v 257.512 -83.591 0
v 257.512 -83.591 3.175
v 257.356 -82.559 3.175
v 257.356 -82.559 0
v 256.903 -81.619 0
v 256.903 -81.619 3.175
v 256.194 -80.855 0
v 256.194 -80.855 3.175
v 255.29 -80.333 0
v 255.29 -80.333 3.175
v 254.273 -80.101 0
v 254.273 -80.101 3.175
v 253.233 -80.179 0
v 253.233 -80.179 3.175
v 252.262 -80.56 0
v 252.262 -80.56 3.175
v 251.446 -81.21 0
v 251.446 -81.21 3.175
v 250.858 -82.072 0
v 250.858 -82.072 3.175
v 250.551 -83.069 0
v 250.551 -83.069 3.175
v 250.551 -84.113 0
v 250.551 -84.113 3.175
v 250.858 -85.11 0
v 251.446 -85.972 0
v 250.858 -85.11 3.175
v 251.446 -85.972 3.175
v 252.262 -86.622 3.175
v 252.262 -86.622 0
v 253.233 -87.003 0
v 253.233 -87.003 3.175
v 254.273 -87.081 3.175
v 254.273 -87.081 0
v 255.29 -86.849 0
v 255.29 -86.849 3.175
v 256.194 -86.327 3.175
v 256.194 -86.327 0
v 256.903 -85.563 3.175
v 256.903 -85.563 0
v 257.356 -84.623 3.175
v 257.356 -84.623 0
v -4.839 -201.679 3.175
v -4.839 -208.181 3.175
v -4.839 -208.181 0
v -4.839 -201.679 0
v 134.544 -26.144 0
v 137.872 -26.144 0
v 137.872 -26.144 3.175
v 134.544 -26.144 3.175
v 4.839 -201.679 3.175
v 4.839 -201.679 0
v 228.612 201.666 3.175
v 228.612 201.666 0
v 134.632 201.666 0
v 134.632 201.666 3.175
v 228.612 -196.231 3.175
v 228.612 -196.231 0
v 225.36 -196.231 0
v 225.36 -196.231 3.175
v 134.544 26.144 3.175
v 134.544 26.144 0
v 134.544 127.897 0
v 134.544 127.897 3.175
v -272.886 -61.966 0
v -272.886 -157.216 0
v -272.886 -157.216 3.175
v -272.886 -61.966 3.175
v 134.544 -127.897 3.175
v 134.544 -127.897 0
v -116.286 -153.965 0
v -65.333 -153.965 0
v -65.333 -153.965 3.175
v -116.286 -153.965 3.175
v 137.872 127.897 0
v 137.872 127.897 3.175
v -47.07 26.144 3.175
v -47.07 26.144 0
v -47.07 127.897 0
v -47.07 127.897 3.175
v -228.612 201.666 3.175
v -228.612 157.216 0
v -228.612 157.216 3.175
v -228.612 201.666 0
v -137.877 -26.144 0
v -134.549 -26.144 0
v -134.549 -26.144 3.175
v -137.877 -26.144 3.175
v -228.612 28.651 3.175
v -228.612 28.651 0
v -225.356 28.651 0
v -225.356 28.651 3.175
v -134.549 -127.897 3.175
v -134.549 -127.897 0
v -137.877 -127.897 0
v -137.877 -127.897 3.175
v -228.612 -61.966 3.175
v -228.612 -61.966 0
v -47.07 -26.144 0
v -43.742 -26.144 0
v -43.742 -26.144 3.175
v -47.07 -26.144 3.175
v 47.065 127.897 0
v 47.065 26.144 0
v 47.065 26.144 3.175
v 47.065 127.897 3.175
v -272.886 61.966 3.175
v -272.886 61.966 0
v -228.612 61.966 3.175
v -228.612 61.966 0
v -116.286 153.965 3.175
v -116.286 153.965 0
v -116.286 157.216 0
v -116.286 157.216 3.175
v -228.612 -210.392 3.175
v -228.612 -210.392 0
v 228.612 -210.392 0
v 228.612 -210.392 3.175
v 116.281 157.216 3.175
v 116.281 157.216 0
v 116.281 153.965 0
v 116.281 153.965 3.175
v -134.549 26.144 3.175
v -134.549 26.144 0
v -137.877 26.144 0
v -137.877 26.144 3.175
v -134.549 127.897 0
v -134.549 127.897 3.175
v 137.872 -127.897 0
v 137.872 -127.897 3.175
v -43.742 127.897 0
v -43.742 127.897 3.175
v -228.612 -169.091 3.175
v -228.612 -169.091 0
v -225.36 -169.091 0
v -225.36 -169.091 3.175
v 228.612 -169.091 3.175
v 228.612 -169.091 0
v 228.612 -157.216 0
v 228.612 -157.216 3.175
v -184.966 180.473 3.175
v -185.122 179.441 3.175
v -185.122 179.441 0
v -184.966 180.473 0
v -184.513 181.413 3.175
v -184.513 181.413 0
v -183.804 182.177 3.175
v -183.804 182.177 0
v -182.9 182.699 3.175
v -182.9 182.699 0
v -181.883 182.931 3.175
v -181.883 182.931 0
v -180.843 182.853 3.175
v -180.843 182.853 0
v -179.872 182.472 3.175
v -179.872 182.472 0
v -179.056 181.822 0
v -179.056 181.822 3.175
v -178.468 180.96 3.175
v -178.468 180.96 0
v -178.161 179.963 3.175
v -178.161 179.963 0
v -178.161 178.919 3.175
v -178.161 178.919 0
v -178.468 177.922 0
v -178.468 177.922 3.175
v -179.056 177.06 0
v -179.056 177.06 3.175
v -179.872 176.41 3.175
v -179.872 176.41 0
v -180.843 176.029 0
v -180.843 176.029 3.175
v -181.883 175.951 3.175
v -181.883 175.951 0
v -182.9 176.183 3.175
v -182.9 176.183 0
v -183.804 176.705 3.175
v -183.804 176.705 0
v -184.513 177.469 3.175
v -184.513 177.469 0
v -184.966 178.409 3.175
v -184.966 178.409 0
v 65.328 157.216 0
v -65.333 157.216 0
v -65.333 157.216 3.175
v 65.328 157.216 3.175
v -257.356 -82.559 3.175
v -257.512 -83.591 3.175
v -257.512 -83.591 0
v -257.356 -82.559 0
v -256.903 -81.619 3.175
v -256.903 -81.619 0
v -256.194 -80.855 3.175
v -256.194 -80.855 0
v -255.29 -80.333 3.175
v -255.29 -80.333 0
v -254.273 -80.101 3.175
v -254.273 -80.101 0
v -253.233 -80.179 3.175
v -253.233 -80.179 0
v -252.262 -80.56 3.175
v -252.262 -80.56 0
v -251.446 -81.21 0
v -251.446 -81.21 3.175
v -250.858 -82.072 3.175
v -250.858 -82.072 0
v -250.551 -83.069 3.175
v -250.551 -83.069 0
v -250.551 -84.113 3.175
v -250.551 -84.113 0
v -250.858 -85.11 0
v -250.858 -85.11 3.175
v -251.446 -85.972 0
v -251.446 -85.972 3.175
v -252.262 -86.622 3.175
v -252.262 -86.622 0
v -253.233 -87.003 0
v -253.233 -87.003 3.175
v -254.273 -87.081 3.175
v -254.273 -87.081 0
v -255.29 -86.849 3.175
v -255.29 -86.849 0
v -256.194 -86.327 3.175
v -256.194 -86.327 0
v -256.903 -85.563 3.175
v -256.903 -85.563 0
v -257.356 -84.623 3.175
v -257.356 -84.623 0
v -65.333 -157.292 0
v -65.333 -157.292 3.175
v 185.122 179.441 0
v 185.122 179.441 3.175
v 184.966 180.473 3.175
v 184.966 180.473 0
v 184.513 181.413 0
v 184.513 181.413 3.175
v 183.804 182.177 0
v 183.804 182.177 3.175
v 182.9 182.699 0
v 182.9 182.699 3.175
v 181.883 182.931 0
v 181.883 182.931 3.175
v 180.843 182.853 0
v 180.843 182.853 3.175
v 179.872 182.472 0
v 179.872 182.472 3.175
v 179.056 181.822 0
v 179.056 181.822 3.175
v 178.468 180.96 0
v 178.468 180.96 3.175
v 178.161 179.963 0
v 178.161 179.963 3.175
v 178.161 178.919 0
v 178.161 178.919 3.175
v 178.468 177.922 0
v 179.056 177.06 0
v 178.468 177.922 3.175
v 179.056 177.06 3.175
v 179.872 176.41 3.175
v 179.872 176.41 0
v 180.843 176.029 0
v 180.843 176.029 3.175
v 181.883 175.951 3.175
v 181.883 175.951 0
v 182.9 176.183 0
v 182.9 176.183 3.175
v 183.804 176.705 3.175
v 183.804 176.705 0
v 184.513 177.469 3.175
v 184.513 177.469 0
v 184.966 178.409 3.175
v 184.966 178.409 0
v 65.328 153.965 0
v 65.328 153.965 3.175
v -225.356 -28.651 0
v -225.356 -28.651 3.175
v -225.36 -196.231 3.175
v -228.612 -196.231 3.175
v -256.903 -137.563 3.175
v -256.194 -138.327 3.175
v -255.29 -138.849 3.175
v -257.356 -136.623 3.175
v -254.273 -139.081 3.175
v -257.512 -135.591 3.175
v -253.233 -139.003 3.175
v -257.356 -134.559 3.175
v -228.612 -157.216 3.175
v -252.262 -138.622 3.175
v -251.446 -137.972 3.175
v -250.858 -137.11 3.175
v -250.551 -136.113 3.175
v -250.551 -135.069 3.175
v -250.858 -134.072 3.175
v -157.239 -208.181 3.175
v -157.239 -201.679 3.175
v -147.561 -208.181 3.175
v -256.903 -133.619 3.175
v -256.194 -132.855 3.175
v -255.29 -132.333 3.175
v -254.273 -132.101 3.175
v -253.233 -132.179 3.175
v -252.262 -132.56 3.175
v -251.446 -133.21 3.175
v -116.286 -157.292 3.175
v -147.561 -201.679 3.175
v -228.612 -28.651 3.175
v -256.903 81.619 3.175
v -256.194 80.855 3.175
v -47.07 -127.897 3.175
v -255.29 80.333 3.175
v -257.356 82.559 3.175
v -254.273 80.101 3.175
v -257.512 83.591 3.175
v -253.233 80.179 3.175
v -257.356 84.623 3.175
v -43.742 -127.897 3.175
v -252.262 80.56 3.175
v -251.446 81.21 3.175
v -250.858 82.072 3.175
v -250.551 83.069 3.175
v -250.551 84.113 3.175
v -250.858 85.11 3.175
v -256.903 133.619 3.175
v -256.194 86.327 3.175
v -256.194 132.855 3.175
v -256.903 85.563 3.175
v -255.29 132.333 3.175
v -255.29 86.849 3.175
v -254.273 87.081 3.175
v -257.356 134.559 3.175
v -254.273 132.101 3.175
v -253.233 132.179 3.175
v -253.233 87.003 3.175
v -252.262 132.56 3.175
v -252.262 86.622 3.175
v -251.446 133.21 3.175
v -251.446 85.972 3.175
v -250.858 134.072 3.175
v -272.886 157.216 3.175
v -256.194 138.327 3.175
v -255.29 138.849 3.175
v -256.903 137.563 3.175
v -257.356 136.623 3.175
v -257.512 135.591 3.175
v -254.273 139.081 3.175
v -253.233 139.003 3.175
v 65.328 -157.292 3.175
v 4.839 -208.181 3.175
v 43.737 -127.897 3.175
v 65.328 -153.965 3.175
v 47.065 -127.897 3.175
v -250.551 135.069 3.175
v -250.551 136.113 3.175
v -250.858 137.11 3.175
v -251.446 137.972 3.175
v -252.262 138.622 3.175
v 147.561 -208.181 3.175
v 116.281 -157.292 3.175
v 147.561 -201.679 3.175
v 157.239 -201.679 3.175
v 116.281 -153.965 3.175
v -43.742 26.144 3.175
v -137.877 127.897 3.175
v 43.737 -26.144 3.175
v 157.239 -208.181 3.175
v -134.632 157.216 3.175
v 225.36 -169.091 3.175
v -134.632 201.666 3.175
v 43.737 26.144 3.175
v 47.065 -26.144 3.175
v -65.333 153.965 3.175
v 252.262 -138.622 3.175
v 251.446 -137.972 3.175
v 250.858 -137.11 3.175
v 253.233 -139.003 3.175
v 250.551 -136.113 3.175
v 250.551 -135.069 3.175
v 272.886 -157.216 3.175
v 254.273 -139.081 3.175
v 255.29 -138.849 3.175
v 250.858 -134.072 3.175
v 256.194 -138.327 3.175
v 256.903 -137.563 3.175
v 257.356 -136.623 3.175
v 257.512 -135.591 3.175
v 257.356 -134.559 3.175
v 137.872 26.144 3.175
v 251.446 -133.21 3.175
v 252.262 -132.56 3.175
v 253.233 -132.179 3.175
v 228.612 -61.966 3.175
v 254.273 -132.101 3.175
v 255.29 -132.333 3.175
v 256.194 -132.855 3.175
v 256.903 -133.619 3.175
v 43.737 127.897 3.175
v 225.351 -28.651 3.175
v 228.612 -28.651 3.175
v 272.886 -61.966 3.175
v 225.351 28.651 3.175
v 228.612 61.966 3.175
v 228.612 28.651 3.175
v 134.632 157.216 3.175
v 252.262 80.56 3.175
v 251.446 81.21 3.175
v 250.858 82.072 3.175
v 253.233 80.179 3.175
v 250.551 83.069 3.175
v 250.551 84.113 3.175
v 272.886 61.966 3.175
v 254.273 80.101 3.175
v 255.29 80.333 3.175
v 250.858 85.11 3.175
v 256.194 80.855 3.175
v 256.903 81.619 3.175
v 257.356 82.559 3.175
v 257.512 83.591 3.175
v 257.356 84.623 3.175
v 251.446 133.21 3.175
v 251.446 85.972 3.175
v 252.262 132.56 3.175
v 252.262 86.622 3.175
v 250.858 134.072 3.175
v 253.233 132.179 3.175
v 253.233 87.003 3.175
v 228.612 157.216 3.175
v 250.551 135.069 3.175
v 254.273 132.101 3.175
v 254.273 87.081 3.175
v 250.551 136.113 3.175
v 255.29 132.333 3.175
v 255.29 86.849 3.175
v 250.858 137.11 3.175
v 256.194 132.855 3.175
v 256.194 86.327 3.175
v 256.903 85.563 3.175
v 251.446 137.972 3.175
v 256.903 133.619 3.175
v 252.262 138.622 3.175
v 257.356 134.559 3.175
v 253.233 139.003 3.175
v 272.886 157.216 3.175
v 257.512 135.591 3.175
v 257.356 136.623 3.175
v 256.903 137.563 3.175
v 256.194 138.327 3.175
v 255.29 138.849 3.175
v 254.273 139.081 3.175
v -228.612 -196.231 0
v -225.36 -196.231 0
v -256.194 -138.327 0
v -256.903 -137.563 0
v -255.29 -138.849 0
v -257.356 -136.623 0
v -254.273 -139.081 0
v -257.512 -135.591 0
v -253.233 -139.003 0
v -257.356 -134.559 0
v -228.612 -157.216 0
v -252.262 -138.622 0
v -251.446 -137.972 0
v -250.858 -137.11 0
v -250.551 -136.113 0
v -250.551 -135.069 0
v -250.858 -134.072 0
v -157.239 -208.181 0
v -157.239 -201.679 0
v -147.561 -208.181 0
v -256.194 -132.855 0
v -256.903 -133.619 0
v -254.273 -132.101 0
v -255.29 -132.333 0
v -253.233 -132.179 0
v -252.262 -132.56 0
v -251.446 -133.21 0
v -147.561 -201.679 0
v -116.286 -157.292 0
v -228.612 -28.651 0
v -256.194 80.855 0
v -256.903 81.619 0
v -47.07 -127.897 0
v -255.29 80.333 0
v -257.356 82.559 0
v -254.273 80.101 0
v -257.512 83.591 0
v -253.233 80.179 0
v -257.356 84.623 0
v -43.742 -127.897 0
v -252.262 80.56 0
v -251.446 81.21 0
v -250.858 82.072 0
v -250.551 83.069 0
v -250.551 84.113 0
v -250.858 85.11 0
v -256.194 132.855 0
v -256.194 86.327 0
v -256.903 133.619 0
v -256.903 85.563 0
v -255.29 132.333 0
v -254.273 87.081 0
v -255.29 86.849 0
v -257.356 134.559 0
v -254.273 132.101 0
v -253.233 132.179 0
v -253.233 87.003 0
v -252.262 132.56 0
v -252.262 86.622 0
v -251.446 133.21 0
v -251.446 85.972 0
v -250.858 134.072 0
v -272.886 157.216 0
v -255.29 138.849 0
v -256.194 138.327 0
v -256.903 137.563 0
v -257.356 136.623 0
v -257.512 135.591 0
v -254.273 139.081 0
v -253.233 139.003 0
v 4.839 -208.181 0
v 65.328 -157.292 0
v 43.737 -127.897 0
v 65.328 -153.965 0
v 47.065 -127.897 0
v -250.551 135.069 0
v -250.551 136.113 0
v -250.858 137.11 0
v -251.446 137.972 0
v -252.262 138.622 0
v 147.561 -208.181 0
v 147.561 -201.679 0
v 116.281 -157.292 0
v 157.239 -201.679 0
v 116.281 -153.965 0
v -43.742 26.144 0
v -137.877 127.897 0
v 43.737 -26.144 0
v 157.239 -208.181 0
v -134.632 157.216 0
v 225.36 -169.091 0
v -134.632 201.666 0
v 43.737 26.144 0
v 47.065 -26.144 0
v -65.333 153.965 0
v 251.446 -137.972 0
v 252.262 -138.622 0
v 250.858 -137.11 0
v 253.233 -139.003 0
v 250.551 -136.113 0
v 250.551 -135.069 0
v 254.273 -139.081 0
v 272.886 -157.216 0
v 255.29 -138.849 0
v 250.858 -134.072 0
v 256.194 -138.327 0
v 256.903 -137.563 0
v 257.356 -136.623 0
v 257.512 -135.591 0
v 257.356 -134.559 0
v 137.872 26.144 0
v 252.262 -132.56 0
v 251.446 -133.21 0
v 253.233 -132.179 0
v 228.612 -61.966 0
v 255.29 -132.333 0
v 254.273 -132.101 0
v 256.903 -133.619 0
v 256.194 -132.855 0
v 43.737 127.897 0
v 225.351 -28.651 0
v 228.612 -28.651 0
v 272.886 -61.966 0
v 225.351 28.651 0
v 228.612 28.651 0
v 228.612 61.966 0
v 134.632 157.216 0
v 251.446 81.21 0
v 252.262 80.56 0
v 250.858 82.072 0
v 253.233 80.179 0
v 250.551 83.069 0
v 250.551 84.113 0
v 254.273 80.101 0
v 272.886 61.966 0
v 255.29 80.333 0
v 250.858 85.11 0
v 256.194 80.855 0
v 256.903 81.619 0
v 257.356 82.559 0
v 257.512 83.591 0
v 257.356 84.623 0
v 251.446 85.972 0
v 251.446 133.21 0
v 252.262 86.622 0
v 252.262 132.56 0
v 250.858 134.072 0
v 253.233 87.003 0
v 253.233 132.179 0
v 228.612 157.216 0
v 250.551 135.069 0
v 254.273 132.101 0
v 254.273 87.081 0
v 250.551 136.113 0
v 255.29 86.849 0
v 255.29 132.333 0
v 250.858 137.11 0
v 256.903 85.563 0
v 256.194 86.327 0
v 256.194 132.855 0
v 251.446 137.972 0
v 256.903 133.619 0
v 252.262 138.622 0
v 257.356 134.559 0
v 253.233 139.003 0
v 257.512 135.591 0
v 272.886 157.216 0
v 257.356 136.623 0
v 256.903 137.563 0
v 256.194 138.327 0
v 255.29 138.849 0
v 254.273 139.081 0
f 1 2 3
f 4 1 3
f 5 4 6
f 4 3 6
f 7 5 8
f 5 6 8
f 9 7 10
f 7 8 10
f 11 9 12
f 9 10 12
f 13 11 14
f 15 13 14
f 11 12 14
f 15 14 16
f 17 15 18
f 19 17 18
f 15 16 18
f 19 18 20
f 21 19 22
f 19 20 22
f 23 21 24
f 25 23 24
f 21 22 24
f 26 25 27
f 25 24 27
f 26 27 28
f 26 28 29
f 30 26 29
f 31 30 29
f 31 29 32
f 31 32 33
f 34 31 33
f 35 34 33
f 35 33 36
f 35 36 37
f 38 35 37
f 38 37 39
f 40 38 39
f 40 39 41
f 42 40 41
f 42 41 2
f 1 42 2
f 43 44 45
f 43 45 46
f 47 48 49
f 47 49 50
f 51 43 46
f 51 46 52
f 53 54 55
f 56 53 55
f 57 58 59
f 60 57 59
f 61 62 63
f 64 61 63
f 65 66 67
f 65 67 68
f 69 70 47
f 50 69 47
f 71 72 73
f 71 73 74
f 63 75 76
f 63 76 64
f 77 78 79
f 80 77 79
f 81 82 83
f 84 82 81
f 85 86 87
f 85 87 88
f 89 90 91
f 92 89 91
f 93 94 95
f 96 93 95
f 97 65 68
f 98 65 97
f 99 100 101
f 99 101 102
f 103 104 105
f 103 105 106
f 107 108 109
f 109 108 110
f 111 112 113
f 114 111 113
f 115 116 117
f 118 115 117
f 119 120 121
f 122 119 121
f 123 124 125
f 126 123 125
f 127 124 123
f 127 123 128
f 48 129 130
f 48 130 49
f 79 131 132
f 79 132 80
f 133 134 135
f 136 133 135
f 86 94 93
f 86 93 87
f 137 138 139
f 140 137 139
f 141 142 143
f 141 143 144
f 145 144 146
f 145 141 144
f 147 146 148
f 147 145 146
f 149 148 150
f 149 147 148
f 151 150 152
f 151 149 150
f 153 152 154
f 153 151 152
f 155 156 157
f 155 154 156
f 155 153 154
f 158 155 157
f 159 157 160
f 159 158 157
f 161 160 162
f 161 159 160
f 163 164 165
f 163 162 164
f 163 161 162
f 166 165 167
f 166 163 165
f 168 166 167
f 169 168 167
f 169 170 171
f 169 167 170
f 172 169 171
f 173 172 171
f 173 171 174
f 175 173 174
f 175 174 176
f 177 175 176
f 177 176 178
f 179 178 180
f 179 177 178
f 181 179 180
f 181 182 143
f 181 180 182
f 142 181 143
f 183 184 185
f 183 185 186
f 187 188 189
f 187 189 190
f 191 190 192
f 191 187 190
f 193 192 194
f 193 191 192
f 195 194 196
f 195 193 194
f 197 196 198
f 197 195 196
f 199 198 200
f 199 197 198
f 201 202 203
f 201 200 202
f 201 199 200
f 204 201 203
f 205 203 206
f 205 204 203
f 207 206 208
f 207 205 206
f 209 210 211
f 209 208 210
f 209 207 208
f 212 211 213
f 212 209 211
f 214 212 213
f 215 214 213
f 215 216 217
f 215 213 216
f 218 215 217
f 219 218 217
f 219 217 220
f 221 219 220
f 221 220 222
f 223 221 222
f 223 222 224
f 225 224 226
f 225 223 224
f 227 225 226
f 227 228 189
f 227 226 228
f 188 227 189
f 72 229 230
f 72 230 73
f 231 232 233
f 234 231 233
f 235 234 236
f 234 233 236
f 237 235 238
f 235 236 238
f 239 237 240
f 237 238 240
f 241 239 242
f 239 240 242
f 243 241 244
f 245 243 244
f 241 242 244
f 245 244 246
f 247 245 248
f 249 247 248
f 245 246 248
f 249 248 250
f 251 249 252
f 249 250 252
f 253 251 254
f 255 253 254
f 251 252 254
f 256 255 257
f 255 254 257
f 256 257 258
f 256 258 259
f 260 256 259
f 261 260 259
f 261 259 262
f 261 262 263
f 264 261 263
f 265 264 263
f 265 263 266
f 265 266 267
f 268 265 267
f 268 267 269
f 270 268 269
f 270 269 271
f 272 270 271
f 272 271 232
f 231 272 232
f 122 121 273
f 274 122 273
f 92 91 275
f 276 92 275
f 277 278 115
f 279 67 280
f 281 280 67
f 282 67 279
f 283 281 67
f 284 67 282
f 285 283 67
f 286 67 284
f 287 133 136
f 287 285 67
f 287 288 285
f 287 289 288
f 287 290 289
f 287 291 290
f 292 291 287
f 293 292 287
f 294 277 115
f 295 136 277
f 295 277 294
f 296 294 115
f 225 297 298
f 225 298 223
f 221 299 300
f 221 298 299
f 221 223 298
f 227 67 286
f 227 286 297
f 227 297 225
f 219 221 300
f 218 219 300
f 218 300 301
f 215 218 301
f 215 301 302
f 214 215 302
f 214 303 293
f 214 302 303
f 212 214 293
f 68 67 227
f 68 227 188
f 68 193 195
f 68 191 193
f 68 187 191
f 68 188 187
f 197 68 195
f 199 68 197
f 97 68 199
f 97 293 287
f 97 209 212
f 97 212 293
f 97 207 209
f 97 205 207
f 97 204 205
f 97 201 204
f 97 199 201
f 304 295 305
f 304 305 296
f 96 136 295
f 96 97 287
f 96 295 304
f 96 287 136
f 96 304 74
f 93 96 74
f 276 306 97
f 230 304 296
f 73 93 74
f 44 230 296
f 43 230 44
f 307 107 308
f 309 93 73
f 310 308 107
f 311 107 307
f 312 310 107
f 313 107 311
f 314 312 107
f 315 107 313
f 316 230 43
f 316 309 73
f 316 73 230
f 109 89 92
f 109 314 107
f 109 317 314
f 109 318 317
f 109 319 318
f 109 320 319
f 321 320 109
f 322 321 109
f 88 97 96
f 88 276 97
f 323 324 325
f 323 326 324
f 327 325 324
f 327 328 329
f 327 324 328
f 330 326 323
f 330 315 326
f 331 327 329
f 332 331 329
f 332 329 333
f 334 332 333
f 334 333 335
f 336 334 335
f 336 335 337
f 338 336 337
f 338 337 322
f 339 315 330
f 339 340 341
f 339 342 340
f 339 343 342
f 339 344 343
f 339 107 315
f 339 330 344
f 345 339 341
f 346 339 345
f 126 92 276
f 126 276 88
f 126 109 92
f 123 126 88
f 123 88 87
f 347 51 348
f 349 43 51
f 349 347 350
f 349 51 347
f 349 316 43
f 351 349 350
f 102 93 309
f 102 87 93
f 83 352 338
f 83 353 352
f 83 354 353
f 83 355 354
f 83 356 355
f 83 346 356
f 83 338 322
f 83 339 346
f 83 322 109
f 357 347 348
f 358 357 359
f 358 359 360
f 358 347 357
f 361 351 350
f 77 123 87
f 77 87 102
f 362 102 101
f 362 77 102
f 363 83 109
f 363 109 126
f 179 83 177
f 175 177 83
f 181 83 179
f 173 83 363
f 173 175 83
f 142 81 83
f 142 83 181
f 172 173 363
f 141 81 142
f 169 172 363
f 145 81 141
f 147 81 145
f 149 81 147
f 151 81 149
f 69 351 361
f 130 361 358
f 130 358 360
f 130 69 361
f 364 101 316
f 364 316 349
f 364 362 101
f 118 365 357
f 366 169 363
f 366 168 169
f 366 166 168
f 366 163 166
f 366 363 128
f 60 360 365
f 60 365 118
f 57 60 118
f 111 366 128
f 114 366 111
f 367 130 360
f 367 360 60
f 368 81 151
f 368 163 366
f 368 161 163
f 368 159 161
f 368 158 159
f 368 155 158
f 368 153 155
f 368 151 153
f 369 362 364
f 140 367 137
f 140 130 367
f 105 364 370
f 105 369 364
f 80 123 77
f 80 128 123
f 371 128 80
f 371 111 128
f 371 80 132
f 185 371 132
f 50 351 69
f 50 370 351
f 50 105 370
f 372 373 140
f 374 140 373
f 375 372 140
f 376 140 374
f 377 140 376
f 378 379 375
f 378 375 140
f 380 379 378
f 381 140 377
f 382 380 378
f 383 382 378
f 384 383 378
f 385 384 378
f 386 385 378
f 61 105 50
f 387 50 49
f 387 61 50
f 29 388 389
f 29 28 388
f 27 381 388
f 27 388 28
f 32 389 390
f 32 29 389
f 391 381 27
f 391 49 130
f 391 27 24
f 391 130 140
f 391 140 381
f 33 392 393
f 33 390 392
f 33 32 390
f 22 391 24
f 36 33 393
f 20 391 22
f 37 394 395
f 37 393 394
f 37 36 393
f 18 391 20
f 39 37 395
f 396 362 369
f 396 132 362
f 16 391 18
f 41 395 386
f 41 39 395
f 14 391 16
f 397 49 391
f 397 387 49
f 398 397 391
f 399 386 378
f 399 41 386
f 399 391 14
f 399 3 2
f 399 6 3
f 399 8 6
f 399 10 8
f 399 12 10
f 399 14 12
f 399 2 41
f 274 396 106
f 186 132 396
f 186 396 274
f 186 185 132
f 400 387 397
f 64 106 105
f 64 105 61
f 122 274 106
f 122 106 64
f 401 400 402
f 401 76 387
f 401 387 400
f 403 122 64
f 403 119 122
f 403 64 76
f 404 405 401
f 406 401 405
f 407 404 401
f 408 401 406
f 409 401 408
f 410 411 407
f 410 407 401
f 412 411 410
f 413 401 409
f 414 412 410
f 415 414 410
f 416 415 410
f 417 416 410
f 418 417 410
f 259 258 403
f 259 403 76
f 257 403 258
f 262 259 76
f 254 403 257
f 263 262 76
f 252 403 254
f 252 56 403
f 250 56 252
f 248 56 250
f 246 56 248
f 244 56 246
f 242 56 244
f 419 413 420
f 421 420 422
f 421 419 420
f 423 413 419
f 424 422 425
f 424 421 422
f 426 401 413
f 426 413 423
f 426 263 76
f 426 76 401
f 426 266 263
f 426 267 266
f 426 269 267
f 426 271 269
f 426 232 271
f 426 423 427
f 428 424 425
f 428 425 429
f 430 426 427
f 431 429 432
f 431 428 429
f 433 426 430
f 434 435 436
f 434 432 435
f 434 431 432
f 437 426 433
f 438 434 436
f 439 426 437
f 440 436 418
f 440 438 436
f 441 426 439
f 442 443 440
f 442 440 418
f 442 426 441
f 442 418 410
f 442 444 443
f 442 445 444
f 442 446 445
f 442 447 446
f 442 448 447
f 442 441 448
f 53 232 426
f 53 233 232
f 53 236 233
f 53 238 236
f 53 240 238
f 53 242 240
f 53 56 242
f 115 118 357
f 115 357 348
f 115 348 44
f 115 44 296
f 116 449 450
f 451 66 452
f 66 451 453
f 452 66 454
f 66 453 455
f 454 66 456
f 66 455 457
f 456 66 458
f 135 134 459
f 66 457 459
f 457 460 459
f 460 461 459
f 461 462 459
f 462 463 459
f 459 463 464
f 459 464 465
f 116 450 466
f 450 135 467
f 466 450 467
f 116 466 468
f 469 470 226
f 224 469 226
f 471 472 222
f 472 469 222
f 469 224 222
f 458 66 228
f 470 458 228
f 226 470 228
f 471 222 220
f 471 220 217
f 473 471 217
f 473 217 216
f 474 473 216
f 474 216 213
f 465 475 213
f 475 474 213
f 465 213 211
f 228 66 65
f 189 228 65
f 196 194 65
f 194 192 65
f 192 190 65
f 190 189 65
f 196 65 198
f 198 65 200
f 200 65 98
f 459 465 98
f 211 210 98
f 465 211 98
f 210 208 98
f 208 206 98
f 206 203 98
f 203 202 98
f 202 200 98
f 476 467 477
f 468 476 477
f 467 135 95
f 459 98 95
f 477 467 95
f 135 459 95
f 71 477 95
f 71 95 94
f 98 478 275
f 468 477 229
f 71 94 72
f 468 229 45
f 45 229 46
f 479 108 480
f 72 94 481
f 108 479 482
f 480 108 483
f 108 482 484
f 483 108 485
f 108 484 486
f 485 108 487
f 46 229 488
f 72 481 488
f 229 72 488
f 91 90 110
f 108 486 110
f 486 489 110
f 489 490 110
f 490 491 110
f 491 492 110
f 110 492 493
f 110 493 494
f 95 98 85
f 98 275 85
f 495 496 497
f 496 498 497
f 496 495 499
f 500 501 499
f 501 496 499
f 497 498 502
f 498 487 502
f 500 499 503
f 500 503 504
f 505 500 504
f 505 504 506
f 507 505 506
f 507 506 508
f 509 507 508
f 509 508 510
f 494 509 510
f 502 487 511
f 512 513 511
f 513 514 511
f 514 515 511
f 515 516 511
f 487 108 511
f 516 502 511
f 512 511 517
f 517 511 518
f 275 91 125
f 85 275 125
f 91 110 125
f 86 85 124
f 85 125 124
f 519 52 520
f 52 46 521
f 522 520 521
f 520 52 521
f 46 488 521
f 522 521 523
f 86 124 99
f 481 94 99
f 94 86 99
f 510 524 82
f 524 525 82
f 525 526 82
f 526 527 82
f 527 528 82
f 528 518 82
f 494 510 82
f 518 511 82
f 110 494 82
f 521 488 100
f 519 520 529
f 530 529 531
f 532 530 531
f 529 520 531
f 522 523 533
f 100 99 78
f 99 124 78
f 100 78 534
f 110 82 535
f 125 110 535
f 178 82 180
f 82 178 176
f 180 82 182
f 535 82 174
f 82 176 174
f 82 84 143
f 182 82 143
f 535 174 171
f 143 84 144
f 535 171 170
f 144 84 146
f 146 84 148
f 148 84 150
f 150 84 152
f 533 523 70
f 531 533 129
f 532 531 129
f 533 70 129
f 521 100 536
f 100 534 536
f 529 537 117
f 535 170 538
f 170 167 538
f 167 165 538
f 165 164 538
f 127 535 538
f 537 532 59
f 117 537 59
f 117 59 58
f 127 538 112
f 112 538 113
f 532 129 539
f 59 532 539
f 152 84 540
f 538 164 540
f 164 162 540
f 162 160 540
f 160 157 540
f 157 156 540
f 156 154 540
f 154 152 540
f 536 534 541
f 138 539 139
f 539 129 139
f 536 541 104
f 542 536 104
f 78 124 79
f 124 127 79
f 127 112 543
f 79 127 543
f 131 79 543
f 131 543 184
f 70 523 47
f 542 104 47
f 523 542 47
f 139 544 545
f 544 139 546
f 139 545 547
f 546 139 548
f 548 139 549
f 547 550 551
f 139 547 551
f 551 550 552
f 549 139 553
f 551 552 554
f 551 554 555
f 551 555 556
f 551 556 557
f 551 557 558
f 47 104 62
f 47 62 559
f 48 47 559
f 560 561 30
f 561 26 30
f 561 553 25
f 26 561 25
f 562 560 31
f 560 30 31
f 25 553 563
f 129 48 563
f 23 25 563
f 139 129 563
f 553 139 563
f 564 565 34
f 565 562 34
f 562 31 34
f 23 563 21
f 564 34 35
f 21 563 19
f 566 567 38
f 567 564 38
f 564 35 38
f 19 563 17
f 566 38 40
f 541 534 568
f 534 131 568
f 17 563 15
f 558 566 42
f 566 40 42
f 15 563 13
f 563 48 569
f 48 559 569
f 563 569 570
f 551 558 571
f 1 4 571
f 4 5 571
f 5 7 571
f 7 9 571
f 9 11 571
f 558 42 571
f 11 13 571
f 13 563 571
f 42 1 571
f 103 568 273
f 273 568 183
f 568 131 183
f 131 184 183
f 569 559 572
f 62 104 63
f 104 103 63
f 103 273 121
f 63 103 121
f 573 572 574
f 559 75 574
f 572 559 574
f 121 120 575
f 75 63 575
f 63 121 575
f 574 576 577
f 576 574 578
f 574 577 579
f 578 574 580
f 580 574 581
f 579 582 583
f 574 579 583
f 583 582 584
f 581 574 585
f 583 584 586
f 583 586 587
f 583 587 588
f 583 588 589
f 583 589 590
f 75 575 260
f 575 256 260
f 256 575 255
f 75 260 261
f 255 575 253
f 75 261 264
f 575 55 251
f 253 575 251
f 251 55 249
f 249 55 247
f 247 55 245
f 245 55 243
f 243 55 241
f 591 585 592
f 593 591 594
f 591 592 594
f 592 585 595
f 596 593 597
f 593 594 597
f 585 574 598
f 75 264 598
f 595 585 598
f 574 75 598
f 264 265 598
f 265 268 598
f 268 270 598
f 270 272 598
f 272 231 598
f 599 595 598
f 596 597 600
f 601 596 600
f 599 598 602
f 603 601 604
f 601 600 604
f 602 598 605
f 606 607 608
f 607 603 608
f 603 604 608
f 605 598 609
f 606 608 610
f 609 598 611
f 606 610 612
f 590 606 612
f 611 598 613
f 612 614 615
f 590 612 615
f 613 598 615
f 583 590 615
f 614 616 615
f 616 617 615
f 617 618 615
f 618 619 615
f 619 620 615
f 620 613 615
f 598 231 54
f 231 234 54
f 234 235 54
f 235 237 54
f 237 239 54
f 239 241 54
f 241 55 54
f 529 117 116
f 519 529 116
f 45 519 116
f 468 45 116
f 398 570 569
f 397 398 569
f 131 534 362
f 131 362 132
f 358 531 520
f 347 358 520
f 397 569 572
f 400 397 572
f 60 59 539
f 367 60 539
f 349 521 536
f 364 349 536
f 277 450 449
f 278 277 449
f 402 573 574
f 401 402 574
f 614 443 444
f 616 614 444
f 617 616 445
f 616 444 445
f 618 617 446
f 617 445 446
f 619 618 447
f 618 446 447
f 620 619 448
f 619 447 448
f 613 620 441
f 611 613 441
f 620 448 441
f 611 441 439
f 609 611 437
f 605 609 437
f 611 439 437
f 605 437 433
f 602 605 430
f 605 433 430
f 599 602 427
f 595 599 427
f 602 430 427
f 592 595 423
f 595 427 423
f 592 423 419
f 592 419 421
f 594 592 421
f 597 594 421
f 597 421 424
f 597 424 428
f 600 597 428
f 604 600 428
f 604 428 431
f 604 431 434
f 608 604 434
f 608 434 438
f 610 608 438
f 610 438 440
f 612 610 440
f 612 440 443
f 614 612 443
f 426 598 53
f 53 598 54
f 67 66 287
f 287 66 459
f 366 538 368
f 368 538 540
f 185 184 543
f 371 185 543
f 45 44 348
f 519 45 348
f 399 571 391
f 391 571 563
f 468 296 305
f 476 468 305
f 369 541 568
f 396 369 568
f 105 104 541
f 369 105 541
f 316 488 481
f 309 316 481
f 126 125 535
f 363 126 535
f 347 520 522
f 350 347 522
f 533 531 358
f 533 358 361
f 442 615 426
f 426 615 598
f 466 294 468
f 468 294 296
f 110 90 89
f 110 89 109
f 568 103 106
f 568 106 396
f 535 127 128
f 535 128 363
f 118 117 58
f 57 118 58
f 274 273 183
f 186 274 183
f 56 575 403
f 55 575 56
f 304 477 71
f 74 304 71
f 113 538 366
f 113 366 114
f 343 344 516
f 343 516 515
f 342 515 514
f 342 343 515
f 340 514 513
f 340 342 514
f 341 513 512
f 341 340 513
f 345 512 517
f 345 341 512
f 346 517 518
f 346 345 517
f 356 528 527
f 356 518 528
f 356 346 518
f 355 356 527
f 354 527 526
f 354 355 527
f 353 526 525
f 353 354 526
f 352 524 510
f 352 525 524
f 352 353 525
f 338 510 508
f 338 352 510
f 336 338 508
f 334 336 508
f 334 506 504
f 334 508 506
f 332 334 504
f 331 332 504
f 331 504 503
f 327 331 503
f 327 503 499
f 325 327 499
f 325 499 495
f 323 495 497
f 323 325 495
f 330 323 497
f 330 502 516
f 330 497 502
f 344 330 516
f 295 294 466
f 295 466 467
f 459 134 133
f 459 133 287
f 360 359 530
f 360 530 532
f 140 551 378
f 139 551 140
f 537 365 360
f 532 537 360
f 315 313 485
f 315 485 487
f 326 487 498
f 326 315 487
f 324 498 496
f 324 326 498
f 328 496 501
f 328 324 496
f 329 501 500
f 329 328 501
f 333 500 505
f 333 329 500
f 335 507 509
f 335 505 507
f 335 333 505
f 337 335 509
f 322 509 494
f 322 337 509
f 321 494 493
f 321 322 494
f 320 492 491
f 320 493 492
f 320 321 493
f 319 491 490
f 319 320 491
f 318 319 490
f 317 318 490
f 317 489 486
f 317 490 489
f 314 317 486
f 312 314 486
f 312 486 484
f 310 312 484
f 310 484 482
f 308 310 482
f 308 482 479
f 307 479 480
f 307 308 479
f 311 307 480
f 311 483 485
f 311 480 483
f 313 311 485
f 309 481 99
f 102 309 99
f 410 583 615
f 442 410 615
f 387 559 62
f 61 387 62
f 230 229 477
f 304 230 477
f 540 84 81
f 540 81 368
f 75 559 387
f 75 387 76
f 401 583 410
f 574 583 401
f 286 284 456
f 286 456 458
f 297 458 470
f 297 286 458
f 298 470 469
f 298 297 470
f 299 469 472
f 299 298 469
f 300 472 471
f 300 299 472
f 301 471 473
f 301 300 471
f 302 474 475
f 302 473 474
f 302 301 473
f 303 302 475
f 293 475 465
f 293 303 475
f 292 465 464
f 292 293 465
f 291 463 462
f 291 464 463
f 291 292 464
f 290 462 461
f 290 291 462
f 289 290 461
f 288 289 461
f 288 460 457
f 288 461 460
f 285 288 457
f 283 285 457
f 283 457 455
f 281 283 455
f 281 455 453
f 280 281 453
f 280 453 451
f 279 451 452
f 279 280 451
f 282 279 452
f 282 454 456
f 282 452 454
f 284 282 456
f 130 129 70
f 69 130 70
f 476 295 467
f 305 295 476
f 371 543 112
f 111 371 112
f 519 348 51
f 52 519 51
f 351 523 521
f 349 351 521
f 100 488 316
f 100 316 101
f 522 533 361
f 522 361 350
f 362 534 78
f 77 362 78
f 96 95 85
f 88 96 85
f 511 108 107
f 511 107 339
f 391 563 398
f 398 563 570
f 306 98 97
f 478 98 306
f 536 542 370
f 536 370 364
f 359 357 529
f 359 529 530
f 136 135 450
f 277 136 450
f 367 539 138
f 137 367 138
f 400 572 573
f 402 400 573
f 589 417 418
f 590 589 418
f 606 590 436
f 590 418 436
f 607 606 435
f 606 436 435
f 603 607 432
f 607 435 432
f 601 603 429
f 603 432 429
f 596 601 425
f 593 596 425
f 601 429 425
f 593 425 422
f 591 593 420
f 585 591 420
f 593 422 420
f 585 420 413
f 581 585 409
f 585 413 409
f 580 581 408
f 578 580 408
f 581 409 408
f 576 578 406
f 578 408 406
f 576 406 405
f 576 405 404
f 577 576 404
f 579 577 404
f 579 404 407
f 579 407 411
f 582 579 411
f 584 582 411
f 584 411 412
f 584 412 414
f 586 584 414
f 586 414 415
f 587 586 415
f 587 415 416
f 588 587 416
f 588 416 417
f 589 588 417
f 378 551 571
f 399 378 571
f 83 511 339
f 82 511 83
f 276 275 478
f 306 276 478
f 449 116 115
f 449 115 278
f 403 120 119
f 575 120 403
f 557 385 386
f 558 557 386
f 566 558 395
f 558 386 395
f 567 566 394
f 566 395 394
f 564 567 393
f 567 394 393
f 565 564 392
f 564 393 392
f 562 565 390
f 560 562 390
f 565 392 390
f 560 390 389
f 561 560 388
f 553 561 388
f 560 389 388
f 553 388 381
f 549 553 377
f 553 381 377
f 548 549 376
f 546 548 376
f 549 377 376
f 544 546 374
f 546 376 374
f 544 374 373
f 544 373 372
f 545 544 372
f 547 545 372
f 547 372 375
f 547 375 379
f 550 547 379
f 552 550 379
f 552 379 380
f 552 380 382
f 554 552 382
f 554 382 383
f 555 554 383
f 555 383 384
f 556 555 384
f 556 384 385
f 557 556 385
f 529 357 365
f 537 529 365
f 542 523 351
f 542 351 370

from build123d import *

# Parameters (mm, degrees)
SKETCH1_W            = 457.223
SKETCH1_H            = 367.60800004
BOSS_EXTRUDE2_DEPTH  = 3.175
SKETCH8_W            = 44.275
SKETCH8_H            = 95.25
SKETCH8_W_2          = 93.98
SKETCH8_H_2          = 44.45
BOSS_EXTRUDE3_DEPTH  = 3.175
M6_CLEARANCE_HOLE1_D = 7
SKETCH12_W           = 3.184
SKETCH12_H           = 57.15
SKETCH12_W_2         = 3.175
SKETCH12_H_2         = 26.9875
SKETCH12_W_3         = 50.9524
SKETCH12_H_3         = 3.3274
SKETCH12_W_4         = 50.8
SKETCH12_H_4         = 3.175
SKETCH12_W_5         = 3.179
CUT_EXTRUDE3_DEPTH   = 345.589489363
SKETCH14_W           = 3.3274
SKETCH14_H           = 101.7524
SKETCH14_W_2         = 3.175
SKETCH14_H_2         = 101.6
CUT_EXTRUDE4_DEPTH   = 345.589489363
LPATTERN2_COUNT      = 4
LPATTERN2_PITCH      = 90.806999996
SKETCH16_W           = 9.6774
SKETCH16_H           = 6.5024
SKETCH16_W_2         = 9.525
SKETCH16_H_2         = 6.35
CUT_EXTRUDE5_DEPTH   = 345.589489363


with BuildPart() as part:
    # Sketch1 → Boss-Extrude2 (new body)
    with BuildSketch(Plane.XY):
        with Locations((0, -26.588)):
            Rectangle(SKETCH1_W, SKETCH1_H)
    extrude(amount=BOSS_EXTRUDE2_DEPTH)

    # Sketch8 → Boss-Extrude3 (add)
    with BuildSketch(Plane(origin=(0, 0, 0), x_dir=(-1, 0, 0), z_dir=(0, 0, -1))):
        with Locations((-250.749, 109.59100002)):
            Rectangle(SKETCH8_W, SKETCH8_H)
        with Locations((-181.6215, 179.44100002)):
            Rectangle(SKETCH8_W_2, SKETCH8_H_2)
        with Locations((-250.749, -109.59100002)):
            Rectangle(SKETCH8_W, SKETCH8_H)
    boss_extrude3 = extrude(amount=-BOSS_EXTRUDE3_DEPTH)

    # Mirror7: Boss-Extrude3 across plane
    add(boss_extrude3.mirror(Plane(origin=(0, 0, 0), x_dir=(0, 0, 1), z_dir=(1, 0, 0))))

    # M6 Clearance Hole1 (through all)
    with Locations(Plane(origin=(0, 0, 0), x_dir=(-1, 0, 0), z_dir=(0, 0, -1))):
        with Locations((-254.0115, -135.59100002), (-254.0115, -83.59100002), (-254.0115, 83.59100002), (-254.0115, 135.59100002), (-181.6215, 179.44100002)):
            m6_clearance_hole1 = Hole(M6_CLEARANCE_HOLE1_D / 2)

    # Mirror8: M6 Clearance Hole1 across plane
    add(m6_clearance_hole1.mirror(Plane(origin=(0, 0, 0), x_dir=(0, 0, 1), z_dir=(1, 0, 0))), mode=Mode.SUBTRACT)

    # Sketch12 → Cut-Extrude3 (cut, through all)
    # profile 1 of 16: a face of its own
    with BuildSketch(Plane(origin=(0, 0, 0), x_dir=(-1, 0, 0), z_dir=(0, 0, -1))):
        with Locations((-227.0195, 0)):
            Rectangle(SKETCH12_W, SKETCH12_H)
    # profile 2 of 16: a face of its own
    with BuildSketch(Plane(origin=(0, 0, 0), x_dir=(-1, 0, 0), z_dir=(0, 0, -1))):
        Polygon((-228.6115, 28.6512), (-228.6115, 28.575), (-225.4275, 28.575), (-225.4275, -28.575), (-228.6115, -28.575), (-228.6115, -28.6512), (-225.3513, -28.6512), (-225.3513, 28.6512), align=None)
    # profile 3 of 16: a face of its own
    with BuildSketch(Plane(origin=(0, 0, 0), x_dir=(-1, 0, 0), z_dir=(0, 0, -1))):
        with Locations((-227.024, -182.66100002)):
            Rectangle(SKETCH12_W_2, SKETCH12_H_2)
    # profile 4 of 16: a face of its own
    with BuildSketch(Plane(origin=(0, 0, 0), x_dir=(-1, 0, 0), z_dir=(0, 0, -1))):
        Polygon((-228.6115, -196.15475002), (-228.6115, -196.23095002), (-225.3603, -196.23095002), (-225.3603, -169.09105002), (-228.6115, -169.09105002), (-228.6115, -169.16725002), (-225.4365, -169.16725002), (-225.4365, -196.15475002), align=None)
    # profile 5 of 16: a face of its own
    with BuildSketch(Plane(origin=(0, 0, 0), x_dir=(-1, 0, 0), z_dir=(0, 0, -1))):
        with Locations((-90.8045, -155.62850002)):
            Rectangle(SKETCH12_W_3, SKETCH12_H_3)
        with Locations((-90.8045, -155.62850002)):
            Rectangle(SKETCH12_W_4, SKETCH12_H_4, mode=Mode.SUBTRACT)
    # profile 6 of 16: a face of its own
    with BuildSketch(Plane(origin=(0, 0, 0), x_dir=(-1, 0, 0), z_dir=(0, 0, -1))):
        with Locations((-90.8045, -155.62850002)):
            Rectangle(SKETCH12_W_4, SKETCH12_H_4)
    # profile 7 of 16: a face of its own
    with BuildSketch(Plane(origin=(0, 0, 0), x_dir=(-1, 0, 0), z_dir=(0, 0, -1))):
        with Locations((90.8095, -155.62850002)):
            Rectangle(SKETCH12_W_3, SKETCH12_H_3)
        with Locations((90.8095, -155.62850002)):
            Rectangle(SKETCH12_W_4, SKETCH12_H_4, mode=Mode.SUBTRACT)
    # profile 8 of 16: a face of its own
    with BuildSketch(Plane(origin=(0, 0, 0), x_dir=(-1, 0, 0), z_dir=(0, 0, -1))):
        with Locations((90.8095, -155.62850002)):
            Rectangle(SKETCH12_W_4, SKETCH12_H_4)
    # profile 9 of 16: a face of its own
    with BuildSketch(Plane(origin=(0, 0, 0), x_dir=(-1, 0, 0), z_dir=(0, 0, -1))):
        with Locations((227.024, -182.66100002)):
            Rectangle(SKETCH12_W_2, SKETCH12_H_2)
    # profile 10 of 16: a face of its own
    with BuildSketch(Plane(origin=(0, 0, 0), x_dir=(-1, 0, 0), z_dir=(0, 0, -1))):
        Polygon((225.3603, -196.23095002), (228.6115, -196.23095002), (228.6115, -196.15475002), (225.4365, -196.15475002), (225.4365, -169.16725002), (228.6115, -169.16725002), (228.6115, -169.09105002), (225.3603, -169.09105002), align=None)
    # profile 11 of 16: a face of its own
    with BuildSketch(Plane(origin=(0, 0, 0), x_dir=(-1, 0, 0), z_dir=(0, 0, -1))):
        with Locations((227.022, 0)):
            Rectangle(SKETCH12_W_5, SKETCH12_H)
    # profile 12 of 16: a face of its own
    with BuildSketch(Plane(origin=(0, 0, 0), x_dir=(-1, 0, 0), z_dir=(0, 0, -1))):
        Polygon((225.4325, -28.575), (225.4325, 28.575), (228.6115, 28.575), (228.6115, 28.6512), (225.3563, 28.6512), (225.3563, -28.6512), (228.6115, -28.6512), (228.6115, -28.575), align=None)
    # profile 13 of 16: a face of its own
    with BuildSketch(Plane(origin=(0, 0, 0), x_dir=(-1, 0, 0), z_dir=(0, 0, -1))):
        with Locations((90.8095, 155.62850002)):
            Rectangle(SKETCH12_W_4, SKETCH12_H_4)
    # profile 14 of 16: a face of its own
    with BuildSketch(Plane(origin=(0, 0, 0), x_dir=(-1, 0, 0), z_dir=(0, 0, -1))):
        Polygon((65.4095, 157.21600002), (65.3333, 157.21600002), (65.3333, 153.96480002), (116.2857, 153.96480002), (116.2857, 157.21600002), (116.2095, 157.21600002), (116.2095, 154.04100002), (65.4095, 154.04100002), align=None)
    # profile 15 of 16: a face of its own
    with BuildSketch(Plane(origin=(0, 0, 0), x_dir=(-1, 0, 0), z_dir=(0, 0, -1))):
        with Locations((-90.8045, 155.62850002)):
            Rectangle(SKETCH12_W_4, SKETCH12_H_4)
    # profile 16 of 16: a face of its own
    with BuildSketch(Plane(origin=(0, 0, 0), x_dir=(-1, 0, 0), z_dir=(0, 0, -1))):
        Polygon((-116.2045, 154.04100002), (-116.2045, 157.21600002), (-116.2807, 157.21600002), (-116.2807, 153.96480002), (-65.3283, 153.96480002), (-65.3283, 157.21600002), (-65.4045, 157.21600002), (-65.4045, 154.04100002), align=None)
    extrude(amount=-CUT_EXTRUDE3_DEPTH, mode=Mode.SUBTRACT)

    # Sketch14 → Cut-Extrude4 (cut, through all)
    # profile 1 of 4: a face of its own
    with BuildSketch(Plane(origin=(0, 0, 0), x_dir=(-1, 0, 0), z_dir=(0, 0, -1))):
        with Locations((-136.208, 77.02050001)):
            Rectangle(SKETCH14_W, SKETCH14_H)
        with Locations((-136.208, 77.02050001)):
            Rectangle(SKETCH14_W_2, SKETCH14_H_2, mode=Mode.SUBTRACT)
    # profile 2 of 4: a face of its own
    with BuildSketch(Plane(origin=(0, 0, 0), x_dir=(-1, 0, 0), z_dir=(0, 0, -1))):
        with Locations((-136.208, 77.02050001)):
            Rectangle(SKETCH14_W_2, SKETCH14_H_2)
    # profile 3 of 4: a face of its own
    with BuildSketch(Plane(origin=(0, 0, 0), x_dir=(-1, 0, 0), z_dir=(0, 0, -1))):
        with Locations((-136.208, -77.02050001)):
            Rectangle(SKETCH14_W, SKETCH14_H)
        with Locations((-136.208, -77.02050001)):
            Rectangle(SKETCH14_W_2, SKETCH14_H_2, mode=Mode.SUBTRACT)
    # profile 4 of 4: a face of its own
    with BuildSketch(Plane(origin=(0, 0, 0), x_dir=(-1, 0, 0), z_dir=(0, 0, -1))):
        with Locations((-136.208, -77.02050001)):
            Rectangle(SKETCH14_W_2, SKETCH14_H_2)
    cut_extrude4 = extrude(amount=-CUT_EXTRUDE4_DEPTH, mode=Mode.SUBTRACT)

    # LPattern2: Cut-Extrude4 ×4
    with Locations(*[(-i * LPATTERN2_PITCH, 0, 0) for i in range(1, LPATTERN2_COUNT)]):
        add(cut_extrude4, mode=Mode.SUBTRACT)

    # Sketch16 → Cut-Extrude5 (cut, through all)
    # profile 1 of 6: a face of its own
    with BuildSketch(Plane.XY.offset(3.175)):
        with Locations((152.4, -204.92974)):
            Rectangle(SKETCH16_W, SKETCH16_H)
        with Locations((152.4, -204.92974)):
            Rectangle(SKETCH16_W_2, SKETCH16_H_2, mode=Mode.SUBTRACT)
    # profile 2 of 6: a face of its own
    with BuildSketch(Plane.XY.offset(3.175)):
        with Locations((152.4, -204.92974)):
            Rectangle(SKETCH16_W_2, SKETCH16_H_2)
    # profile 3 of 6: a face of its own
    with BuildSketch(Plane.XY.offset(3.175)):
        with Locations((0, -204.92974)):
            Rectangle(SKETCH16_W, SKETCH16_H)
        with Locations((0, -204.92974)):
            Rectangle(SKETCH16_W_2, SKETCH16_H_2, mode=Mode.SUBTRACT)
    # profile 4 of 6: a face of its own
    with BuildSketch(Plane.XY.offset(3.175)):
        with Locations((0, -204.92974)):
            Rectangle(SKETCH16_W_2, SKETCH16_H_2)
    # profile 5 of 6: a face of its own
    with BuildSketch(Plane.XY.offset(3.175)):
        with Locations((-152.4, -204.92974)):
            Rectangle(SKETCH16_W, SKETCH16_H)
        with Locations((-152.4, -204.92974)):
            Rectangle(SKETCH16_W_2, SKETCH16_H_2, mode=Mode.SUBTRACT)
    # profile 6 of 6: a face of its own
    with BuildSketch(Plane.XY.offset(3.175)):
        with Locations((-152.4, -204.92974)):
            Rectangle(SKETCH16_W_2, SKETCH16_H_2)
    extrude(amount=-CUT_EXTRUDE5_DEPTH, mode=Mode.SUBTRACT)


solid = part.part
